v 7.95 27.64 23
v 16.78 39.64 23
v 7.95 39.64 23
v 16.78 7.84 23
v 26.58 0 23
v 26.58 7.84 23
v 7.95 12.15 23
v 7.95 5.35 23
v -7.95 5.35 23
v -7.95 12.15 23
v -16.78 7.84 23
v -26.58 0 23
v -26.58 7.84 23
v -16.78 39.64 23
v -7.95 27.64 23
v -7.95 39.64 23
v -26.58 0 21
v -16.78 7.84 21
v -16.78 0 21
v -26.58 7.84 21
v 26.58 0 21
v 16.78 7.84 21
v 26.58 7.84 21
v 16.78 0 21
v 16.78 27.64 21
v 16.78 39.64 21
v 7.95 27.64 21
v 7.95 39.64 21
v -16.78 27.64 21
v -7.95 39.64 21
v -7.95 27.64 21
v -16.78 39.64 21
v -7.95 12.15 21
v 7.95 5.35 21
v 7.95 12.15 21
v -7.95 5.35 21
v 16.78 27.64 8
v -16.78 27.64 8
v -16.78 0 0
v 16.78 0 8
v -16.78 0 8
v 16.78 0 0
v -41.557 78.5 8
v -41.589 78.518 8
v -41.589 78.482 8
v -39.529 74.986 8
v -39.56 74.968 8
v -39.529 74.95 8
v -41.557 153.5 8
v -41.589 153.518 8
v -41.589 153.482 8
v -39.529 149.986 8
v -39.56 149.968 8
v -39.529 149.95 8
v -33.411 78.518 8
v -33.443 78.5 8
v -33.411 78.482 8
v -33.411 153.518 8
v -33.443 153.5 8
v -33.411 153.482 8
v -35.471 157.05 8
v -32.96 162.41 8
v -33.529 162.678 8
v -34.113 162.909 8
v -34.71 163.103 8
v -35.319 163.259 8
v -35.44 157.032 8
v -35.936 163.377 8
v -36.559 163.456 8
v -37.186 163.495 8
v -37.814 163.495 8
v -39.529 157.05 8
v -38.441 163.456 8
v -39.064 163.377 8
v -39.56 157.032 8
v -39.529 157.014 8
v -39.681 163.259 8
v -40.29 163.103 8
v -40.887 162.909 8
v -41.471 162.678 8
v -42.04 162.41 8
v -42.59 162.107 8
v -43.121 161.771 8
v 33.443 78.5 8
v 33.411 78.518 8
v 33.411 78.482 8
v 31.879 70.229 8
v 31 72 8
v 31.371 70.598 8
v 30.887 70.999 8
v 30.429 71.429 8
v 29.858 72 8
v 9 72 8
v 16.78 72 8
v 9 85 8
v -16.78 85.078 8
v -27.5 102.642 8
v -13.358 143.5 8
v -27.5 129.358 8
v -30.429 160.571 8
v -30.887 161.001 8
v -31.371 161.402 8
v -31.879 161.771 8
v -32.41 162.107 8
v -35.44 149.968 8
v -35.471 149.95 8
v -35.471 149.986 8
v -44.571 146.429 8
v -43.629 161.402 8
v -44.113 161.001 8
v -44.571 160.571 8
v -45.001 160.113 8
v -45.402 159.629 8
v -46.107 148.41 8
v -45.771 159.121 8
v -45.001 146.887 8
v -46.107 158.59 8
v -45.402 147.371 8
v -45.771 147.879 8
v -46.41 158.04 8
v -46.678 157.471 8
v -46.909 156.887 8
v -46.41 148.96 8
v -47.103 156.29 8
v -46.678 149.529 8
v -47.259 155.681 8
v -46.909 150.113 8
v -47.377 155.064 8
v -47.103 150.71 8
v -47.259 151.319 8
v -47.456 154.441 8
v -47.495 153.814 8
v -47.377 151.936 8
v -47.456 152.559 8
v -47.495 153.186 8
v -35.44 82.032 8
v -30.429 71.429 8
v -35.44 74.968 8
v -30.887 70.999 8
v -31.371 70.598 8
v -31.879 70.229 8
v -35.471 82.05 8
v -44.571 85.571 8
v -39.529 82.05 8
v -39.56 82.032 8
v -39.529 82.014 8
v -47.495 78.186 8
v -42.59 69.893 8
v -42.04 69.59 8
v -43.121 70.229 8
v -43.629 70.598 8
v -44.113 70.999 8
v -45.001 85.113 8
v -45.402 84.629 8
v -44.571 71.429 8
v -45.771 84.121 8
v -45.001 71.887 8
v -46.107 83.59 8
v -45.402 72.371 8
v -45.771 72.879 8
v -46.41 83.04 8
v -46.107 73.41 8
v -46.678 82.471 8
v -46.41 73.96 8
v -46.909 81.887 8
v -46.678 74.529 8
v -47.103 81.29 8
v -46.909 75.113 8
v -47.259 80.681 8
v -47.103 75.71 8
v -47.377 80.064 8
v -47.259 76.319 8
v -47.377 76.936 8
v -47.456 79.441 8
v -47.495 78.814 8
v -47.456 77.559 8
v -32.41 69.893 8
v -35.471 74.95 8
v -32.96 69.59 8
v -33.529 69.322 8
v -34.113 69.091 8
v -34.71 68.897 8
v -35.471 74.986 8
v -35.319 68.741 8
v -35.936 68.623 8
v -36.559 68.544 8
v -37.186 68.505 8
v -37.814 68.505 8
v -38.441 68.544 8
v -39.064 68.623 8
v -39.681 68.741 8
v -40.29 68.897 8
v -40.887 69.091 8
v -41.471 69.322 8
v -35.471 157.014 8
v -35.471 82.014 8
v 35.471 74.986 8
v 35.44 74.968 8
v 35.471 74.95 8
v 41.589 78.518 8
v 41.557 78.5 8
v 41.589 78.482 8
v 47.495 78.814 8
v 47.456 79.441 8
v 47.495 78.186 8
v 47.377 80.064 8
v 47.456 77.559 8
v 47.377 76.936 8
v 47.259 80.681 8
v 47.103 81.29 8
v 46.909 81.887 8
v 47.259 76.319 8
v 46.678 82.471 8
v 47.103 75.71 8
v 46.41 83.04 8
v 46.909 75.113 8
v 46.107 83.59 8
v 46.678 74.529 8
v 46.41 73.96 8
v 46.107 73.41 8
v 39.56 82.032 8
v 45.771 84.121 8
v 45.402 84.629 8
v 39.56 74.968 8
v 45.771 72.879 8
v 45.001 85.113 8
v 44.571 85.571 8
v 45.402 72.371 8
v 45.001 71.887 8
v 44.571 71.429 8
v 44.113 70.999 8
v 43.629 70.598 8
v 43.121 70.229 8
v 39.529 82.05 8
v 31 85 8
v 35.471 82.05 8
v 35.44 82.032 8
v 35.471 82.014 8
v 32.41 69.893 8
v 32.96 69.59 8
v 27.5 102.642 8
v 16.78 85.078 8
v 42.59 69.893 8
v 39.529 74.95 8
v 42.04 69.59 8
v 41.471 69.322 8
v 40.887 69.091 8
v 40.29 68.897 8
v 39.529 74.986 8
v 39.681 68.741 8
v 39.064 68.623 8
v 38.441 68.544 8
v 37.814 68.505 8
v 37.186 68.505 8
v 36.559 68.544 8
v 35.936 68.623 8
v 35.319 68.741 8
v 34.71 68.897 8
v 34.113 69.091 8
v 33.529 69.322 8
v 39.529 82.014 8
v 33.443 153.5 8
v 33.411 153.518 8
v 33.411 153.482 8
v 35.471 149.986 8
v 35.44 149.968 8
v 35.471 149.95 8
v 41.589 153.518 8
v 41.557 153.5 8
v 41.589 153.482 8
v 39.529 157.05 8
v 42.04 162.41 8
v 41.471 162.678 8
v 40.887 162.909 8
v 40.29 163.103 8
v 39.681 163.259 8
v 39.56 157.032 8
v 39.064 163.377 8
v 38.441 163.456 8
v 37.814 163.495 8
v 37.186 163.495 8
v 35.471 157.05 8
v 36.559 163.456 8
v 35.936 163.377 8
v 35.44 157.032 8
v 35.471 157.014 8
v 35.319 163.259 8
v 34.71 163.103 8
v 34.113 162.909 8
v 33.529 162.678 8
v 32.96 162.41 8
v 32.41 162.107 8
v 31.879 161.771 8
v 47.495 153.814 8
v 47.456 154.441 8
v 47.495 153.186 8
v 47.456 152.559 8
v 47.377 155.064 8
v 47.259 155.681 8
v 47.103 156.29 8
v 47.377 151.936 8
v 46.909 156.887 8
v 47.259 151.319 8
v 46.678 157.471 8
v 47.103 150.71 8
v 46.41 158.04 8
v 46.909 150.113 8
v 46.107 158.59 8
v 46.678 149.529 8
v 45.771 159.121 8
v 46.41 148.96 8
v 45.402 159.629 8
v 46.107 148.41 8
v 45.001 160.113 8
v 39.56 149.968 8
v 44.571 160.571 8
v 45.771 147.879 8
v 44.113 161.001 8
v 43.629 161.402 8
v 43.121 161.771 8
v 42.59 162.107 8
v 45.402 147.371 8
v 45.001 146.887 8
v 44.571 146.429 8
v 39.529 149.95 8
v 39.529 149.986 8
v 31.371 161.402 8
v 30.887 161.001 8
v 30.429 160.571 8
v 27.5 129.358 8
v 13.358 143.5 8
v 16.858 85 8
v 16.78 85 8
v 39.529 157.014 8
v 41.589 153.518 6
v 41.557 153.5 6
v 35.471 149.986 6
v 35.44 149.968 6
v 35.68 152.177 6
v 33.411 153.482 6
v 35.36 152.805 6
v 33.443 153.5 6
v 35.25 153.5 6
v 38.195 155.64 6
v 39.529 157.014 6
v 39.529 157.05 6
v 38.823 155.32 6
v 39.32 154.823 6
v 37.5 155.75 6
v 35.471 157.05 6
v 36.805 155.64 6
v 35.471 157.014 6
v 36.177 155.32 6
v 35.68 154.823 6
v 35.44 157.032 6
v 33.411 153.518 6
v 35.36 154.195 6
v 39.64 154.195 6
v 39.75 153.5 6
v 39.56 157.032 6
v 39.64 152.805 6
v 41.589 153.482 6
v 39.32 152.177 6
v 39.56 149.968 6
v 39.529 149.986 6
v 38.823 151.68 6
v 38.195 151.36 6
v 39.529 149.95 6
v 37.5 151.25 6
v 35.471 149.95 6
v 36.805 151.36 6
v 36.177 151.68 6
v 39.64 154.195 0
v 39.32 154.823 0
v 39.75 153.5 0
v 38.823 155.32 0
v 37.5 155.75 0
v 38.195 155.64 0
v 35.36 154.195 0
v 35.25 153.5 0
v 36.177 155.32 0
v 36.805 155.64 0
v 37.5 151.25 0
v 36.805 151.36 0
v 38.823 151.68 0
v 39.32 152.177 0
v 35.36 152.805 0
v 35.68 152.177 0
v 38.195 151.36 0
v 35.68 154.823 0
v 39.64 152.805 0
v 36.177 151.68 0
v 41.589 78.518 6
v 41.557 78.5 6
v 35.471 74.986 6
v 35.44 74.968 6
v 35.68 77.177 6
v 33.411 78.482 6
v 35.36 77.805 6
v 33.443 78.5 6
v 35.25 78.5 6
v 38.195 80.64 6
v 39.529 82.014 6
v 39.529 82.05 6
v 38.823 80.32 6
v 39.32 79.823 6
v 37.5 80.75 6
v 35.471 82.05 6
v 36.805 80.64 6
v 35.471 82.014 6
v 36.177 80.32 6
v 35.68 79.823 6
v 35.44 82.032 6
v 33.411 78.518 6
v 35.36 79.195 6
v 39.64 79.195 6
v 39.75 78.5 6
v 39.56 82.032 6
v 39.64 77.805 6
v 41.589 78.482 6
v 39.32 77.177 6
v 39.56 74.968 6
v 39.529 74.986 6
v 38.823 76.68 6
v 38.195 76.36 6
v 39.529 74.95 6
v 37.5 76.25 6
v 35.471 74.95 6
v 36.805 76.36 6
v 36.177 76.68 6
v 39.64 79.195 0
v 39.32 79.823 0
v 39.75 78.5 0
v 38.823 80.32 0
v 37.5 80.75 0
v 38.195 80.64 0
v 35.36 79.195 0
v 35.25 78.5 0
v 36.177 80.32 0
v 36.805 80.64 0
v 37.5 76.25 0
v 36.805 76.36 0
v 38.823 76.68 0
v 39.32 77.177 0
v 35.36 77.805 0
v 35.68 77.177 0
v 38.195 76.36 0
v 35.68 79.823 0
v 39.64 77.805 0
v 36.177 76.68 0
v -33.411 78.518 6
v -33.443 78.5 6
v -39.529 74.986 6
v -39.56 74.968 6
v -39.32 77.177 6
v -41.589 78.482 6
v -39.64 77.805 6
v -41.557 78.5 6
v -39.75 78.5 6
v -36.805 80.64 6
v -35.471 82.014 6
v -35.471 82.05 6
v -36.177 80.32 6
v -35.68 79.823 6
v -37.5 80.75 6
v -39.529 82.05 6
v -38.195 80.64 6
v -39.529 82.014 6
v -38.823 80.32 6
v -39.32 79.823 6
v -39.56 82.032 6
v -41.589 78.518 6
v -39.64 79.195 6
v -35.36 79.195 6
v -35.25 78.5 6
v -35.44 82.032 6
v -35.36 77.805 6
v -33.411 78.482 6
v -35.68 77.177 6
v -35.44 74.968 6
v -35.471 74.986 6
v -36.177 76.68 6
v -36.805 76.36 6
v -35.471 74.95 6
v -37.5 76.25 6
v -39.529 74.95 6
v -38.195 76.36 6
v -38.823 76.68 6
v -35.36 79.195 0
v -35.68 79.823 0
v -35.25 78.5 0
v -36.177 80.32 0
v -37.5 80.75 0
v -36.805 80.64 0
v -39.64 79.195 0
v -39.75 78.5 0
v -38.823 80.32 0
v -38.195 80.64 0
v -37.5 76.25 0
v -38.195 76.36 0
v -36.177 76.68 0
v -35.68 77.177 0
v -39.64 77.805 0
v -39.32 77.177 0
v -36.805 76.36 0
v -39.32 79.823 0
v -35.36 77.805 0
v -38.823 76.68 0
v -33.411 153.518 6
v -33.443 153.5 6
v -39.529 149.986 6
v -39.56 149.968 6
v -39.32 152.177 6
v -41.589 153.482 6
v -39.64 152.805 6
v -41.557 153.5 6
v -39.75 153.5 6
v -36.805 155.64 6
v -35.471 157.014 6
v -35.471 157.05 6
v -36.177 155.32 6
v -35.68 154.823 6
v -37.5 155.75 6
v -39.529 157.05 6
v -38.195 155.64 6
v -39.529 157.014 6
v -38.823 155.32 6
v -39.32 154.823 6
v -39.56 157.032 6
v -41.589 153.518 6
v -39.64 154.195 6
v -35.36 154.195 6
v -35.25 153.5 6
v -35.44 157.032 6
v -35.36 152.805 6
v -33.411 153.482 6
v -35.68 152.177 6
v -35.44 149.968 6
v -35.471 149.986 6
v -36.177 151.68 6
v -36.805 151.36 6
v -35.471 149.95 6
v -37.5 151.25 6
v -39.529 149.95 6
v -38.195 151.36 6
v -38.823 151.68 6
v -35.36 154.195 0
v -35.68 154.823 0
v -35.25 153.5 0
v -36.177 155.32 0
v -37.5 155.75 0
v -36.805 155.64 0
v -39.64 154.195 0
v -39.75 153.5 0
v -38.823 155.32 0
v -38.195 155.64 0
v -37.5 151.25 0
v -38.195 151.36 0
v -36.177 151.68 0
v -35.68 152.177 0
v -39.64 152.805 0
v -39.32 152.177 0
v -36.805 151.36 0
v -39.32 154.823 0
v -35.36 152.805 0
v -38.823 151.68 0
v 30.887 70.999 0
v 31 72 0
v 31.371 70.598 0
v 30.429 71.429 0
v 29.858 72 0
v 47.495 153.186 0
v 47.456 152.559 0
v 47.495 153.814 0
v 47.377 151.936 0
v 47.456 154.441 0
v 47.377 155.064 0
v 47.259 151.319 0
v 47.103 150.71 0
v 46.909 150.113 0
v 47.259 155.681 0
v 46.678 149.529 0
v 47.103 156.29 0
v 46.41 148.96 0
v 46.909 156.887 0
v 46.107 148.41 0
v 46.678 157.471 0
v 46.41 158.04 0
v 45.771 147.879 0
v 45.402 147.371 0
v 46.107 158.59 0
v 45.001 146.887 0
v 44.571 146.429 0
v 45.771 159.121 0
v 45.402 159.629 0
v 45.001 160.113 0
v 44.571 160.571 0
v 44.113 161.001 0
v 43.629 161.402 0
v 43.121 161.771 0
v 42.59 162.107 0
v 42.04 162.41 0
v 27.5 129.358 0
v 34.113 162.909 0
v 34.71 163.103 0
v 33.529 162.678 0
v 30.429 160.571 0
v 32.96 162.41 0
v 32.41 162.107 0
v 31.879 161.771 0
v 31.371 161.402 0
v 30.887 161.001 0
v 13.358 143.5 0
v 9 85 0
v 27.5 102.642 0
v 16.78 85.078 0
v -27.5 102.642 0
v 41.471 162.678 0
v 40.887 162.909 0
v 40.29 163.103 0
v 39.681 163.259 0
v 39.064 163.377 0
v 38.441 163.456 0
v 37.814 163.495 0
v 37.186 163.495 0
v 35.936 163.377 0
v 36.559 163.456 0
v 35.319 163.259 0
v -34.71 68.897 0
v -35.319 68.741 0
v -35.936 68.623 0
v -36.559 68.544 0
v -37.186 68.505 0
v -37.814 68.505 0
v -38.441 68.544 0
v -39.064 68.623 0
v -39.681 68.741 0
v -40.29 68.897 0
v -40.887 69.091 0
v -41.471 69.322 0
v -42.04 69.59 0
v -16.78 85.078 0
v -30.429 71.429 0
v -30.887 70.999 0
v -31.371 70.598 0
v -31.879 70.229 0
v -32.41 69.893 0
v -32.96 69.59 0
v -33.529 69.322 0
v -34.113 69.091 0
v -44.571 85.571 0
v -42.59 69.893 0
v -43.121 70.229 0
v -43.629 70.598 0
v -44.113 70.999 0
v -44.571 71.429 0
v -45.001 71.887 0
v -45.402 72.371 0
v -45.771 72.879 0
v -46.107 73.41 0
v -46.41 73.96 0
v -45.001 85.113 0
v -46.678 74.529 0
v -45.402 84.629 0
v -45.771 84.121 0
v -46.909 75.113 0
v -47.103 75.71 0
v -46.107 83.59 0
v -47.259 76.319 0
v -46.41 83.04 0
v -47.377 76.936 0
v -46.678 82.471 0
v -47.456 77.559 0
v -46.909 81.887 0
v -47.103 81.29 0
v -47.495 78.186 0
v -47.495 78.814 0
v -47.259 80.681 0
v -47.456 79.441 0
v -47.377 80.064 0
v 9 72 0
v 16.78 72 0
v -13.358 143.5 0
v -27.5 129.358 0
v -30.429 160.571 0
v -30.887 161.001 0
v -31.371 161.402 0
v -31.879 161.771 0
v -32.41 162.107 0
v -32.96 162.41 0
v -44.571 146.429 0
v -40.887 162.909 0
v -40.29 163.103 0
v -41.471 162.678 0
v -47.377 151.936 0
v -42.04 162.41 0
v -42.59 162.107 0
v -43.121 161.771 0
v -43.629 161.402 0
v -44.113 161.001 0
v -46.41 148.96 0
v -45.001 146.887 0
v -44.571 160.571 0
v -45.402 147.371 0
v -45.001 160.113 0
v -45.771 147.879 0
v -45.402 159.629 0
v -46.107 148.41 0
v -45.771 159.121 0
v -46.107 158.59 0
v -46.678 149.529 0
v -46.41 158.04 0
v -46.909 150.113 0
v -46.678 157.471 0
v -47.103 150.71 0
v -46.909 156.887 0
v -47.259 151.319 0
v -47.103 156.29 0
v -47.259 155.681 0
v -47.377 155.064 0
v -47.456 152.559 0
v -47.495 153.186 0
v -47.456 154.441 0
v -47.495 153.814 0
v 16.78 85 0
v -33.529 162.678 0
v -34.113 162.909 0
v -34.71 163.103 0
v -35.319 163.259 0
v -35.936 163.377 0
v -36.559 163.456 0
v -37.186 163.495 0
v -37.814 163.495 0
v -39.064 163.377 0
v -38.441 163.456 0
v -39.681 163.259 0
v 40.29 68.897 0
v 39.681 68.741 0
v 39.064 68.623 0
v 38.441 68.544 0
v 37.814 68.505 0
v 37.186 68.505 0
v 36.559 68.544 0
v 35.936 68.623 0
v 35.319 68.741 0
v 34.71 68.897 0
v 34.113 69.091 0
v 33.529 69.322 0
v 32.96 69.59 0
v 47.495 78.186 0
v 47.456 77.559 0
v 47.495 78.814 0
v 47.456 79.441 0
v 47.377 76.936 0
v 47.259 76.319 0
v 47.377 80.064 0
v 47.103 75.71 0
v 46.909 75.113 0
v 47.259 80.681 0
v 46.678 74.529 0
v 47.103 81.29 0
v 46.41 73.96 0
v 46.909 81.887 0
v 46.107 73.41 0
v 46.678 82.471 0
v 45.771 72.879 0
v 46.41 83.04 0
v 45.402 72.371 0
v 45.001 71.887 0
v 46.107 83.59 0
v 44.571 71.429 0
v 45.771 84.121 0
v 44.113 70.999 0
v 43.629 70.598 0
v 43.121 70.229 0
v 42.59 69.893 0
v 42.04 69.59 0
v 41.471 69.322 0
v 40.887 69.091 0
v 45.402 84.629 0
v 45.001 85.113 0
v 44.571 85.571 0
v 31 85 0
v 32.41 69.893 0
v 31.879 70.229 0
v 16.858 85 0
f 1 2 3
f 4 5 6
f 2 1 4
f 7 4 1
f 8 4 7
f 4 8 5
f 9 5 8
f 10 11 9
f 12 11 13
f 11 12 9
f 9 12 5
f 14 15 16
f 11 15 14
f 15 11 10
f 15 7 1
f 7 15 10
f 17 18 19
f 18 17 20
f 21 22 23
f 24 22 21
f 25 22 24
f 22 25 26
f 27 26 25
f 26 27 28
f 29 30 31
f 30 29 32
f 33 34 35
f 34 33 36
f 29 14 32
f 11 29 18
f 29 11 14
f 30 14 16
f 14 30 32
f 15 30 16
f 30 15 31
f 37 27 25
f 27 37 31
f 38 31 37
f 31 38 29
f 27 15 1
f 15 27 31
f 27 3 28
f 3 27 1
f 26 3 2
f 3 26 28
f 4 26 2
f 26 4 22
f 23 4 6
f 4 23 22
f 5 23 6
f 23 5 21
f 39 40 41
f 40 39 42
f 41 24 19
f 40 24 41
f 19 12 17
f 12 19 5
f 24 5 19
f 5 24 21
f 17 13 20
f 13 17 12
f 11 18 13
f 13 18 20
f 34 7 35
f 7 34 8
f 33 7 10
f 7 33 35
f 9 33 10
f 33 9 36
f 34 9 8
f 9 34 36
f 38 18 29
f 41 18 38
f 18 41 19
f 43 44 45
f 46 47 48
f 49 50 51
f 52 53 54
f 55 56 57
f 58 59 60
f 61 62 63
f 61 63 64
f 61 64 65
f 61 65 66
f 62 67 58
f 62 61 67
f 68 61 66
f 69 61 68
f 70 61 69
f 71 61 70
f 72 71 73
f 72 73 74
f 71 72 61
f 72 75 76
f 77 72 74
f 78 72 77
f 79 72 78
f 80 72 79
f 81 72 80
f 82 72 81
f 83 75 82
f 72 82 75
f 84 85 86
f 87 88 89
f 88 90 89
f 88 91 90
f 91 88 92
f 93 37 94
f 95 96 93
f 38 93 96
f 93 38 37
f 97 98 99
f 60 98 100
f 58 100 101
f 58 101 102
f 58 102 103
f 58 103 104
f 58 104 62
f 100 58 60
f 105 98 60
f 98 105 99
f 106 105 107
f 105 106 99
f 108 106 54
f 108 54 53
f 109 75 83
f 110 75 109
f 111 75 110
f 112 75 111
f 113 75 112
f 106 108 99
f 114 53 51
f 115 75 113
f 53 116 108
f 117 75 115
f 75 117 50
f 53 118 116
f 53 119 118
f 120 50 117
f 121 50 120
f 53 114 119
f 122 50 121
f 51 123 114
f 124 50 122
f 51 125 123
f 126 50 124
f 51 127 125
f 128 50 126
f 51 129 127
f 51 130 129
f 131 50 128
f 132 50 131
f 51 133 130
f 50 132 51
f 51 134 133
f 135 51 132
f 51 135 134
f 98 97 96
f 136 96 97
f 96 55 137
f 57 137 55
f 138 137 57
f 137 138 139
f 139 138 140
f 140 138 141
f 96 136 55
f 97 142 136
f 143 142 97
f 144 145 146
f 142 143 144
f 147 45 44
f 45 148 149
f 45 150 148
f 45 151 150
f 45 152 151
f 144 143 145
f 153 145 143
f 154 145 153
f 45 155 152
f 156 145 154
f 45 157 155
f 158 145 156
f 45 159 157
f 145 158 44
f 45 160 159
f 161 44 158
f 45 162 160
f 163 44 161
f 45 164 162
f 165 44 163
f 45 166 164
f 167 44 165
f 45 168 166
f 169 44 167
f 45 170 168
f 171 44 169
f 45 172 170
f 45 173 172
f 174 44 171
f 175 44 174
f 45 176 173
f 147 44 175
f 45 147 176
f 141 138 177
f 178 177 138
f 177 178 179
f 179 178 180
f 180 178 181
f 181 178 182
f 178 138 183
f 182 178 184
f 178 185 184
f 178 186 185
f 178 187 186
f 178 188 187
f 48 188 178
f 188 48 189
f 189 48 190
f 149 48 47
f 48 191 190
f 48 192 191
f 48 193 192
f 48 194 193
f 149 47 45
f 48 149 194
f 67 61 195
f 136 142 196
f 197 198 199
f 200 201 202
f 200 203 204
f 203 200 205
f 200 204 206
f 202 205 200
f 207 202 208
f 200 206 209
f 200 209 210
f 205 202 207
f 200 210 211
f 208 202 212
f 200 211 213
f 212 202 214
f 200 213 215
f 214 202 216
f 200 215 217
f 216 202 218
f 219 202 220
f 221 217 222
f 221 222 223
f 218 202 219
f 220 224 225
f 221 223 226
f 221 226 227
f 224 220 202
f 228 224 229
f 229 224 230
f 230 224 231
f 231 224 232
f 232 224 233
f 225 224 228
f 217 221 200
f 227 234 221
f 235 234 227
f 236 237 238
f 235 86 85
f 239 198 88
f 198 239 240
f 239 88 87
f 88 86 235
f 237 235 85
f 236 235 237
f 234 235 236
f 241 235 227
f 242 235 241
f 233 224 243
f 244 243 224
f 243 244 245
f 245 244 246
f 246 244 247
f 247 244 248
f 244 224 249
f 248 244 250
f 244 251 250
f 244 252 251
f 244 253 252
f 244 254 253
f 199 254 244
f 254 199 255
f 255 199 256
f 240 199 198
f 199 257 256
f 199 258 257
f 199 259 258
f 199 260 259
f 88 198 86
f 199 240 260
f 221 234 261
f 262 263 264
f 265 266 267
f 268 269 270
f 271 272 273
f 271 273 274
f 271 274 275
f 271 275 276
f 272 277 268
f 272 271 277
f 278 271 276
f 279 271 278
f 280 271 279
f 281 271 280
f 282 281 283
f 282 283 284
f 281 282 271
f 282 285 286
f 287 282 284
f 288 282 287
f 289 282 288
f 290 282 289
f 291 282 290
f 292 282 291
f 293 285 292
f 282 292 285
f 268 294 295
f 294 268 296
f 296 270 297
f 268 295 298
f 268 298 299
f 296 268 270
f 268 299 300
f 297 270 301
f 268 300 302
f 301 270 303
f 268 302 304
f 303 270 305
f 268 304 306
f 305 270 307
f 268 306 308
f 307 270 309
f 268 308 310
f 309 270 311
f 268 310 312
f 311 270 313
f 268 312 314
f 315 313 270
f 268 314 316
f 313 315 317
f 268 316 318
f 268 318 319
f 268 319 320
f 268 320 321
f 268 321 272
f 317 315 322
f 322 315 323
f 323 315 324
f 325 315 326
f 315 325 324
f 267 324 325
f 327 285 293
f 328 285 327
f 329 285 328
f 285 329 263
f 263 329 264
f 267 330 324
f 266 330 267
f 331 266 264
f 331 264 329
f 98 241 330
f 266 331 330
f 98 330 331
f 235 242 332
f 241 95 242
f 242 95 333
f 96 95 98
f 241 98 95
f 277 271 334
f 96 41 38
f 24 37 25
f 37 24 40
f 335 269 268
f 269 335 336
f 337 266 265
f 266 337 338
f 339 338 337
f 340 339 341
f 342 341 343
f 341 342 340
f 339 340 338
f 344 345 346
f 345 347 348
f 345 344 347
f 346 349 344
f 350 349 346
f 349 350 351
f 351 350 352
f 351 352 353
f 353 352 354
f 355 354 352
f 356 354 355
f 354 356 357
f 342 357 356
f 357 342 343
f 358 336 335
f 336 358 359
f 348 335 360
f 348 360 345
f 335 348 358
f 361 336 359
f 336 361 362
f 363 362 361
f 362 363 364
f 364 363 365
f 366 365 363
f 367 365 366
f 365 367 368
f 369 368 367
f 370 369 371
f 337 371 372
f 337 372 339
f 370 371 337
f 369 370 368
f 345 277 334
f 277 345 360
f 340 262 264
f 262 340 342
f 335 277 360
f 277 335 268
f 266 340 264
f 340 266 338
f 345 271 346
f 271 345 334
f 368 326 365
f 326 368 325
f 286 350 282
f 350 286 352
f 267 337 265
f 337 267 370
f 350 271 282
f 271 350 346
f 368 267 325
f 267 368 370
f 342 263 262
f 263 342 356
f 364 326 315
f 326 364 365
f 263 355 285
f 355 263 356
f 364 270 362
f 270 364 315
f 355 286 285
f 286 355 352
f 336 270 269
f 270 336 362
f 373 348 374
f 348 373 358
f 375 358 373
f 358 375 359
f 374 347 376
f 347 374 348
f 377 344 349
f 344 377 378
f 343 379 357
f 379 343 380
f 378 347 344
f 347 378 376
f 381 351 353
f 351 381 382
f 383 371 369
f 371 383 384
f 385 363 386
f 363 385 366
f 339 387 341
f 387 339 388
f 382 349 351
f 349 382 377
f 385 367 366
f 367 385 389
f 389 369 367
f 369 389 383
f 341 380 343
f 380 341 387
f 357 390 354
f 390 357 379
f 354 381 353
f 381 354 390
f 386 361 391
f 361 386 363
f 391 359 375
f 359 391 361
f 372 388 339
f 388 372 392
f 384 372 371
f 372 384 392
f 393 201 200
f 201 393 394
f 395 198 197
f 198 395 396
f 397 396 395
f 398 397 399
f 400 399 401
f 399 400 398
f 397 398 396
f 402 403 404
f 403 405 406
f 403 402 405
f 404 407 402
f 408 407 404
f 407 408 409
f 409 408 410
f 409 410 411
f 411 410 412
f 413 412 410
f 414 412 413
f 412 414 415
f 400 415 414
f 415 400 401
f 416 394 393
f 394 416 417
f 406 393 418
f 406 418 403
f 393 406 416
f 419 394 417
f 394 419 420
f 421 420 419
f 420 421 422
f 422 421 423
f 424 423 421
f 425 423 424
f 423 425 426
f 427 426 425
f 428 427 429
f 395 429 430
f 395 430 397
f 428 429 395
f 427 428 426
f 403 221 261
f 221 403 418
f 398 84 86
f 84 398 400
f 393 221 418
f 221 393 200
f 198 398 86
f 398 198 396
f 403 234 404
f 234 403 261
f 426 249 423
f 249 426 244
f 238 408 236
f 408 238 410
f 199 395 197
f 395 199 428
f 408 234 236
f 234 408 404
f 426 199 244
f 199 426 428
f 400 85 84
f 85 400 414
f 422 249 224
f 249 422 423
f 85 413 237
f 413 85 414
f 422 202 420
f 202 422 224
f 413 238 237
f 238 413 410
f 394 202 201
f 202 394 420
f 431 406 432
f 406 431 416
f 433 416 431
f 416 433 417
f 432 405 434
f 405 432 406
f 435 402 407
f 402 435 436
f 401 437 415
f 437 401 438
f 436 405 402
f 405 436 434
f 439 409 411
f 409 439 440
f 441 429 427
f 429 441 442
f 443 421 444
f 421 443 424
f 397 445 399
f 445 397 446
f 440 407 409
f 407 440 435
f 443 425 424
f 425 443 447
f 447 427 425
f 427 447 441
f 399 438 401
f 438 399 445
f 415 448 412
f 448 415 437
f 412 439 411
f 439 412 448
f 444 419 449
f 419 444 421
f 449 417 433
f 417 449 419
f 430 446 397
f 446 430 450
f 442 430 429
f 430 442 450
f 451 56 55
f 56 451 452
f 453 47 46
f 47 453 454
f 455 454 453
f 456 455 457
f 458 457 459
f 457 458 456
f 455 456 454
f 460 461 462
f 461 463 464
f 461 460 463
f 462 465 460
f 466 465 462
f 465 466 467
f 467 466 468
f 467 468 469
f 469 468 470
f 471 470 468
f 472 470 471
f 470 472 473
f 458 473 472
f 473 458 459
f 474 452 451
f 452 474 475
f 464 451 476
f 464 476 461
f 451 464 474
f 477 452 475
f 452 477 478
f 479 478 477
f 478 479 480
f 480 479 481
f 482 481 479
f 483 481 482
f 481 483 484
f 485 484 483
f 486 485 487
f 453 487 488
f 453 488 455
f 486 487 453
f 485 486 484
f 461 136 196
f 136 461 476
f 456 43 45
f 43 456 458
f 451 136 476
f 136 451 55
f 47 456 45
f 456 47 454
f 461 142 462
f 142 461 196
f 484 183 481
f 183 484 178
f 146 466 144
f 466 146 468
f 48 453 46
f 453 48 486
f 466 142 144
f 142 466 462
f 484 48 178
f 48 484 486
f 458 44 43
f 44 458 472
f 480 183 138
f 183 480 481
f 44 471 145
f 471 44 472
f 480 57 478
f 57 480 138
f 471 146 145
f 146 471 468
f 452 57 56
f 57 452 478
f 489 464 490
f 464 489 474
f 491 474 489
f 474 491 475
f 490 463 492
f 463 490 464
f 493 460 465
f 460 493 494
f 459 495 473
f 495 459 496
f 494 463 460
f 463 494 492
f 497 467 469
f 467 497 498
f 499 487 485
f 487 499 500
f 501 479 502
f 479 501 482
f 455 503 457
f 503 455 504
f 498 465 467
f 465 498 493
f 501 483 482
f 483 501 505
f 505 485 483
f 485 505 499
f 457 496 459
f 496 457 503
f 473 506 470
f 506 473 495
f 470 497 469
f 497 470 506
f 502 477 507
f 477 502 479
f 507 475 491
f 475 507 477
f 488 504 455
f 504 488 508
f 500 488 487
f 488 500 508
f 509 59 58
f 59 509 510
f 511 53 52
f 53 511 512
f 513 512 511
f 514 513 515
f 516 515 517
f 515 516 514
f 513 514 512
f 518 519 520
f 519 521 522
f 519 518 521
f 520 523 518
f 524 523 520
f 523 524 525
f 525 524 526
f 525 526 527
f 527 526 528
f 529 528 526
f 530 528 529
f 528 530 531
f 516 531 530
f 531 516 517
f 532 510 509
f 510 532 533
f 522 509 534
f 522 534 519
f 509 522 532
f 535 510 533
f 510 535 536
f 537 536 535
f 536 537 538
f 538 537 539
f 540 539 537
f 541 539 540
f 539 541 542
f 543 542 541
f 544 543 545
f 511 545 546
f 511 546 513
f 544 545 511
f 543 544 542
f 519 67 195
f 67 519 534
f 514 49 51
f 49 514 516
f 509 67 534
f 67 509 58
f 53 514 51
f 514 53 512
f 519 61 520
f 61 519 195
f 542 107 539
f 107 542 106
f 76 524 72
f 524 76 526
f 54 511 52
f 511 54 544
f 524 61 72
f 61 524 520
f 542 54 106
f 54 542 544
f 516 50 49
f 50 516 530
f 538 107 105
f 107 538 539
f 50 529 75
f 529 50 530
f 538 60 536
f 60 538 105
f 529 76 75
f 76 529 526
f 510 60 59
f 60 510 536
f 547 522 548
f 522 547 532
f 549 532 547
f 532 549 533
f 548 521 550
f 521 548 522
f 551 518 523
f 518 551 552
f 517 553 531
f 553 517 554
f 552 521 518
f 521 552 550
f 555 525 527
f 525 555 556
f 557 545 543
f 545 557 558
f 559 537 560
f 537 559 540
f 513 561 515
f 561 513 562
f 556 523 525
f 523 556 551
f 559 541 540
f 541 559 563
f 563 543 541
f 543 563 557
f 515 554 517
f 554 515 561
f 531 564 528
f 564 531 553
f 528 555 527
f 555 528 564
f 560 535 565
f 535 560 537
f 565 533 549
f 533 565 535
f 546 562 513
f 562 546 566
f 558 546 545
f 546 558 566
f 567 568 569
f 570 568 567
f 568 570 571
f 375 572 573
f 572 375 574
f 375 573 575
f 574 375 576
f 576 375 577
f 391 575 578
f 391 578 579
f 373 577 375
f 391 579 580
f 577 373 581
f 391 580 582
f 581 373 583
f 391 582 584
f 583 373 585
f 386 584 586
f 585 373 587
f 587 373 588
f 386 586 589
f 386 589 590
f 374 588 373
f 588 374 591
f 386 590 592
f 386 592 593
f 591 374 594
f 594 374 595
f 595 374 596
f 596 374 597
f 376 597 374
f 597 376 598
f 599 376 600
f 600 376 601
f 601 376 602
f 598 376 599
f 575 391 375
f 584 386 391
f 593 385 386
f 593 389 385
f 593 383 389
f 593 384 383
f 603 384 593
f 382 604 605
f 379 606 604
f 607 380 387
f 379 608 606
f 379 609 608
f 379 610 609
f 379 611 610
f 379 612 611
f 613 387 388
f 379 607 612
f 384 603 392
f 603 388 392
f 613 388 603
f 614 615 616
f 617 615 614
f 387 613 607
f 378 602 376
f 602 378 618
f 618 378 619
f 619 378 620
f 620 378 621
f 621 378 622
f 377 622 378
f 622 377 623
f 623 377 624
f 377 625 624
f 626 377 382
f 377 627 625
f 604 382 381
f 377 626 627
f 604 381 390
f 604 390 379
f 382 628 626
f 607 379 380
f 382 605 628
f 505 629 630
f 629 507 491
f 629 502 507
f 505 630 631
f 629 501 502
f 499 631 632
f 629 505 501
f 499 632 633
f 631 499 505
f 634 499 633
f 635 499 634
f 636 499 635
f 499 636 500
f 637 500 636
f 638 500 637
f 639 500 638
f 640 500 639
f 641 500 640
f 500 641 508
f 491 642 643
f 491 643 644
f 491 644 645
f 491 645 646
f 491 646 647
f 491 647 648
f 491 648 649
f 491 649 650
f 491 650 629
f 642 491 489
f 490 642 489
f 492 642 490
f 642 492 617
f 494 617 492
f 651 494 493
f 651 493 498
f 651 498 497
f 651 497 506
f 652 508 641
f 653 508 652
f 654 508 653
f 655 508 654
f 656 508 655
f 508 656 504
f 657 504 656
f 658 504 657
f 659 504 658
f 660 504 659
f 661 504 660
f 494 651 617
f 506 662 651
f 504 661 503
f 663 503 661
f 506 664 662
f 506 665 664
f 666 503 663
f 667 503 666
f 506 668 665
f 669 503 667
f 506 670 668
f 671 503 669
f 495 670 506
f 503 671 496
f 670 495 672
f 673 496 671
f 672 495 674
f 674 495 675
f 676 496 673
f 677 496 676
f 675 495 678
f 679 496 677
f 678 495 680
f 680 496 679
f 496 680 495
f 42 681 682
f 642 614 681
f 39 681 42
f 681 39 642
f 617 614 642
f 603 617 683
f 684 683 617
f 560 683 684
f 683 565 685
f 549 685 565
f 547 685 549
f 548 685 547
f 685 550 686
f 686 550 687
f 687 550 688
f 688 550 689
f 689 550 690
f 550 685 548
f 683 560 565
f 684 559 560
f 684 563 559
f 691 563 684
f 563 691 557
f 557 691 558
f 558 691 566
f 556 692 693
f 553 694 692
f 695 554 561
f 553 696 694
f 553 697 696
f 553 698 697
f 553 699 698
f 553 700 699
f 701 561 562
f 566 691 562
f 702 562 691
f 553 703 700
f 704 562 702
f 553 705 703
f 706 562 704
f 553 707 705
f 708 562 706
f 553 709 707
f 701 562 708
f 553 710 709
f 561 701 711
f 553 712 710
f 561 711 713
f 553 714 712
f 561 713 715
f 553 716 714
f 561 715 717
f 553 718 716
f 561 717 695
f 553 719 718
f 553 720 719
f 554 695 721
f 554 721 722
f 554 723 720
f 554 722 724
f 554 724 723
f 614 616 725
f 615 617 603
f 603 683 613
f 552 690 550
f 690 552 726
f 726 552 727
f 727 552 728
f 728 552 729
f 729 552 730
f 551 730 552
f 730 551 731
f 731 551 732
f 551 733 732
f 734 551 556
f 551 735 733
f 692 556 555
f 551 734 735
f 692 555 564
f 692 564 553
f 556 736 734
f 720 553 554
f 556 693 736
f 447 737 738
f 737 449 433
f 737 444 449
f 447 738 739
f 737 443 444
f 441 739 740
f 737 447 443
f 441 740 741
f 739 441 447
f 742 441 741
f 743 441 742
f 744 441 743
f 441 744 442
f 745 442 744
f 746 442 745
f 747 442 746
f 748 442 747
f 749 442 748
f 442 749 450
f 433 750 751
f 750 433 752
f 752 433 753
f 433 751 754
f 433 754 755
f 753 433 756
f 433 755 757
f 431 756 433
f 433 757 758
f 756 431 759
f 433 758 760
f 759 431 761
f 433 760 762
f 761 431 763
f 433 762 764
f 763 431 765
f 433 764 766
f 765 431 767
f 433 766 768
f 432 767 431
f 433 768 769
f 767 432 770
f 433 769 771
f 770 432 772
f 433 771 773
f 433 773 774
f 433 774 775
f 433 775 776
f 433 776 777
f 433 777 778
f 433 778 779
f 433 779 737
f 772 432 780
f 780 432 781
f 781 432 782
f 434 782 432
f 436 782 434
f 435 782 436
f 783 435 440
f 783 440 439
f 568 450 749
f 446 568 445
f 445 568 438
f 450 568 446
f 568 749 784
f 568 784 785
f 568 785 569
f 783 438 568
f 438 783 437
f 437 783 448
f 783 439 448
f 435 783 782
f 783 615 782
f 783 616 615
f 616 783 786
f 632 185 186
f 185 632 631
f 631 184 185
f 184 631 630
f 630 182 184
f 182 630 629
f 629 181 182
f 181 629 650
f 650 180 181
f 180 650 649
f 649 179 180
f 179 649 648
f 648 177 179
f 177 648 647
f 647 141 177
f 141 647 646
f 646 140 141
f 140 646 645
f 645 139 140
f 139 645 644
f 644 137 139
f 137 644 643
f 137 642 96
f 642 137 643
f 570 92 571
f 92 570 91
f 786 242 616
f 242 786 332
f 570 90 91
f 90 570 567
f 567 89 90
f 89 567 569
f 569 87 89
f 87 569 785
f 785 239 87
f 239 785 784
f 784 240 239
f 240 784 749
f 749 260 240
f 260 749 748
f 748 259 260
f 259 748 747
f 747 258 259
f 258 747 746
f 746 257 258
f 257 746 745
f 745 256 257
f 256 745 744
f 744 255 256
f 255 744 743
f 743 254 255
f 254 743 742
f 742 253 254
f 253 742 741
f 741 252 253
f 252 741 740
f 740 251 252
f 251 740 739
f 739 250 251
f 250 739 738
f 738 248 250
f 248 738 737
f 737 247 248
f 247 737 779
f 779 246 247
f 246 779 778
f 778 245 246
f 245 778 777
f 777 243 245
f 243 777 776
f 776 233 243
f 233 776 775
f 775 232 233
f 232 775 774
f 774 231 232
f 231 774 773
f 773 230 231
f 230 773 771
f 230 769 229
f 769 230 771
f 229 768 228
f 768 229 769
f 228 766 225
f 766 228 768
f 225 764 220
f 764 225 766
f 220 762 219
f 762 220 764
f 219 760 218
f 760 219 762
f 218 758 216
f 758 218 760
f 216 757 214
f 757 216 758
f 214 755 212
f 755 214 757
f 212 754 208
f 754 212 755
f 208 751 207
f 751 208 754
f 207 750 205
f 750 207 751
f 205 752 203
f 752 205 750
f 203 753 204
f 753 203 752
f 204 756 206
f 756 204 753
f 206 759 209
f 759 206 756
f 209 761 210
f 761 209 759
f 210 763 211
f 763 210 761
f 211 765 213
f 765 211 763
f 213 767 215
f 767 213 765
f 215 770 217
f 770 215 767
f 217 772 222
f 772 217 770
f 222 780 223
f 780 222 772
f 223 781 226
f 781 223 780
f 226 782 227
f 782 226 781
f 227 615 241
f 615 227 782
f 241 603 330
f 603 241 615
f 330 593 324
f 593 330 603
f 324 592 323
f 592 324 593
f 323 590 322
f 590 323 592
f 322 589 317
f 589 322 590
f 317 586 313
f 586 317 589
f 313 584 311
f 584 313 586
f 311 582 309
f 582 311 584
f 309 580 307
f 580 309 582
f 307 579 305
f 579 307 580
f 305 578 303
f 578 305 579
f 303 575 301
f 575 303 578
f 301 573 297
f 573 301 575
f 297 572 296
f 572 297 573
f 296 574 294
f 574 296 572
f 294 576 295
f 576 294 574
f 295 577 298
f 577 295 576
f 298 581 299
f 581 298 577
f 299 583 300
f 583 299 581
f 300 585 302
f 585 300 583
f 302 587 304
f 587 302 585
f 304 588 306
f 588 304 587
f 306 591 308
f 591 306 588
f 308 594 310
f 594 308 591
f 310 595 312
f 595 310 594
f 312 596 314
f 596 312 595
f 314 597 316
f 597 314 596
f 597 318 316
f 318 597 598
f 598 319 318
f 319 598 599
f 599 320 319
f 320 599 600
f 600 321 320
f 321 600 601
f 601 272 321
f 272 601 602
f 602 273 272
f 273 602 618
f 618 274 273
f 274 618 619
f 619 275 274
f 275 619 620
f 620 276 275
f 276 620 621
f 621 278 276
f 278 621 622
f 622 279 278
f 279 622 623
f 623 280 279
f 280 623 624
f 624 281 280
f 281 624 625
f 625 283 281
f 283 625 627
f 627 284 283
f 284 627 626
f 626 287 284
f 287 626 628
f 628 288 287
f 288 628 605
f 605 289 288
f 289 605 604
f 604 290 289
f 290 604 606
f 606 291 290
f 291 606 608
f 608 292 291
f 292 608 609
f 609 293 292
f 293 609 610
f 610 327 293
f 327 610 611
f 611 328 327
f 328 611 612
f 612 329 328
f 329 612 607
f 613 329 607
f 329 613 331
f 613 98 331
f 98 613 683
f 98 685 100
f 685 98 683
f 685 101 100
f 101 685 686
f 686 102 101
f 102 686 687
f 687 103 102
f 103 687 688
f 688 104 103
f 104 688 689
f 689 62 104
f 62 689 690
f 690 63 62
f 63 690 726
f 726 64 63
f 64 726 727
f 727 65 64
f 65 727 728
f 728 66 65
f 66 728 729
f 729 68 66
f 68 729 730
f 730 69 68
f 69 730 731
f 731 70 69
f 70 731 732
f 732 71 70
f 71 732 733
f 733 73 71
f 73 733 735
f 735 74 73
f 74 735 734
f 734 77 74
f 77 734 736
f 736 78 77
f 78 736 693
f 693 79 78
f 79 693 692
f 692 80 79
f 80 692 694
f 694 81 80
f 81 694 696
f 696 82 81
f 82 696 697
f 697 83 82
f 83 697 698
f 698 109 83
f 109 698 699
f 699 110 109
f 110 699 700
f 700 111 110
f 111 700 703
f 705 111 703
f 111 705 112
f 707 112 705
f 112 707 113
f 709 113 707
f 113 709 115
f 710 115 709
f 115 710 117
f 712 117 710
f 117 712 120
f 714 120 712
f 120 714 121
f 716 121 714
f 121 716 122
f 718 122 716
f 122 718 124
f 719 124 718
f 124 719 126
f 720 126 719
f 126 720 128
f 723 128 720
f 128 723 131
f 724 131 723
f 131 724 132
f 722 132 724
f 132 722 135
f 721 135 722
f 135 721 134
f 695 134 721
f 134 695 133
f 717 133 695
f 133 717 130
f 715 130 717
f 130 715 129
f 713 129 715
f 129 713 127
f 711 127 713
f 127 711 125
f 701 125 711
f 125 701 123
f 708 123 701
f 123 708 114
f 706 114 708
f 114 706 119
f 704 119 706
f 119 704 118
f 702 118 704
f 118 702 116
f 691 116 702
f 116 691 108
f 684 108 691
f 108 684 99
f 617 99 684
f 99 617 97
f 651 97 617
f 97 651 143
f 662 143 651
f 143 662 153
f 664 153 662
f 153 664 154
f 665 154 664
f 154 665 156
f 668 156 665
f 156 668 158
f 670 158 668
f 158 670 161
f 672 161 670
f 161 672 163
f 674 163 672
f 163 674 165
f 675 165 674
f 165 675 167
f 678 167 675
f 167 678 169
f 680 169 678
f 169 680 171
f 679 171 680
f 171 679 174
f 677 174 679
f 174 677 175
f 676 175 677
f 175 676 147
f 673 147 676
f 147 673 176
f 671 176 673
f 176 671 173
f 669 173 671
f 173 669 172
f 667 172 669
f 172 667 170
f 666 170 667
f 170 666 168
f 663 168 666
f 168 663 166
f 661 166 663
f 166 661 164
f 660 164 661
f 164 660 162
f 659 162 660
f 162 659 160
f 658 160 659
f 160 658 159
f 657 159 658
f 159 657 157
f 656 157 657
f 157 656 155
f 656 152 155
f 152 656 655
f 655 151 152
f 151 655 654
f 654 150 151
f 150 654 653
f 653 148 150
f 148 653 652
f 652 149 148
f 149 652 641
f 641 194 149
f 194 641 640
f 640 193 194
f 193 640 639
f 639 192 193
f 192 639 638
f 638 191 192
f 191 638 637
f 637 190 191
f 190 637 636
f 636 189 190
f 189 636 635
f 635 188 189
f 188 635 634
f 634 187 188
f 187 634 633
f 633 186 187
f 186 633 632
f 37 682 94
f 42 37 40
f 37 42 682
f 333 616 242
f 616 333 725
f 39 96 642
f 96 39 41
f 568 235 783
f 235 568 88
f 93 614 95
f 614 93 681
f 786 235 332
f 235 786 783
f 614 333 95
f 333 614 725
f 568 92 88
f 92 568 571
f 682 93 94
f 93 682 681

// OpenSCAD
vesa = 75;
center_size = 55;

beam_size = 20;
base_thickness = 8;
nut_size = 7.1;
hole_size = 4.5;
nut_depth = 2;

$fn = 100;


module hexagon(size, height) {
  boxWidth = size/1.75;
  for (r = [-60, 0, 60]) rotate([0,0,r]) cube([boxWidth, size, height], true);
}



module hole() {
  translate([0,0, -base_thickness/2])
  cylinder(d=hole_size, base_thickness * 2, $fn=20);
  translate([0,0, base_thickness])
  hexagon(nut_size, nut_depth*2);
}

module beam() {
beam_len = vesa * sqrt(2);
square([beam_len, beam_size], center=true);
translate([beam_len/2, 0])
circle(d=beam_size);
translate([-beam_len/2, 0])
circle(d=beam_size);
}

module base() {
square([center_size, center_size], center = true);

rotate(45)
beam();

rotate(-45)
beam();
}

module vesa_body() {
difference() {
linear_extrude(base_thickness)
base();
  
translate([vesa/2, vesa/2])
hole();  
translate([vesa/2, -vesa/2])
hole();  
translate([-vesa/2, -vesa/2])
hole();  
 translate([-vesa/2, vesa/2])
hole();  
}
}

// insert

insert_thickness = 2;
insert_width = 53.16;
insert_length = 39.64;
top_gap = 15.9;
top_tab_length = 12;
side_tab_width = 7.84;
side_tab_length = 9.8;
hole_pos = 5.71-(40-39.64);
hole_height=6.8;
hole_width=15.9;

adapter_thickness = 13;

vesa_center = 61 + 55;


module insert_base() {
  linear_extrude(insert_thickness)
  difference() {
    square([insert_width, insert_length]);
    
    translate([insert_width/2-hole_width/2, hole_pos])
    square([hole_width, hole_height]);
    
    translate([insert_width/2-top_gap/2, insert_length-top_tab_length])
    square([top_gap, top_tab_length]);
    
    translate([0, side_tab_width])
    square([side_tab_length, insert_length-side_tab_width]);
    
    translate([insert_width-side_tab_length, side_tab_width])
    square([side_tab_length, insert_length-side_tab_width]);
  }

  translate([side_tab_length, 0, insert_thickness])
  cube([insert_width-2*side_tab_length, insert_length-top_tab_length, adapter_thickness]);
}
module adapter() {
translate([insert_width/2, 0, adapter_thickness+insert_thickness+base_thickness])
rotate([0,180])
insert_base();

translate([-insert_width/2+side_tab_length, 0])
cube([insert_width-2*side_tab_length, vesa_center, base_thickness]);

translate([0, vesa_center])
vesa_body();
}

hdmi_height = 13;
hdmi_width = 22;
hdmi_pos_y = 72;
hdmi_pos_x = 9;

difference() {
  adapter();
  
  // HDMI port
  translate([hdmi_pos_x, hdmi_pos_y])
  cube([hdmi_width, hdmi_height, 100]);
}
